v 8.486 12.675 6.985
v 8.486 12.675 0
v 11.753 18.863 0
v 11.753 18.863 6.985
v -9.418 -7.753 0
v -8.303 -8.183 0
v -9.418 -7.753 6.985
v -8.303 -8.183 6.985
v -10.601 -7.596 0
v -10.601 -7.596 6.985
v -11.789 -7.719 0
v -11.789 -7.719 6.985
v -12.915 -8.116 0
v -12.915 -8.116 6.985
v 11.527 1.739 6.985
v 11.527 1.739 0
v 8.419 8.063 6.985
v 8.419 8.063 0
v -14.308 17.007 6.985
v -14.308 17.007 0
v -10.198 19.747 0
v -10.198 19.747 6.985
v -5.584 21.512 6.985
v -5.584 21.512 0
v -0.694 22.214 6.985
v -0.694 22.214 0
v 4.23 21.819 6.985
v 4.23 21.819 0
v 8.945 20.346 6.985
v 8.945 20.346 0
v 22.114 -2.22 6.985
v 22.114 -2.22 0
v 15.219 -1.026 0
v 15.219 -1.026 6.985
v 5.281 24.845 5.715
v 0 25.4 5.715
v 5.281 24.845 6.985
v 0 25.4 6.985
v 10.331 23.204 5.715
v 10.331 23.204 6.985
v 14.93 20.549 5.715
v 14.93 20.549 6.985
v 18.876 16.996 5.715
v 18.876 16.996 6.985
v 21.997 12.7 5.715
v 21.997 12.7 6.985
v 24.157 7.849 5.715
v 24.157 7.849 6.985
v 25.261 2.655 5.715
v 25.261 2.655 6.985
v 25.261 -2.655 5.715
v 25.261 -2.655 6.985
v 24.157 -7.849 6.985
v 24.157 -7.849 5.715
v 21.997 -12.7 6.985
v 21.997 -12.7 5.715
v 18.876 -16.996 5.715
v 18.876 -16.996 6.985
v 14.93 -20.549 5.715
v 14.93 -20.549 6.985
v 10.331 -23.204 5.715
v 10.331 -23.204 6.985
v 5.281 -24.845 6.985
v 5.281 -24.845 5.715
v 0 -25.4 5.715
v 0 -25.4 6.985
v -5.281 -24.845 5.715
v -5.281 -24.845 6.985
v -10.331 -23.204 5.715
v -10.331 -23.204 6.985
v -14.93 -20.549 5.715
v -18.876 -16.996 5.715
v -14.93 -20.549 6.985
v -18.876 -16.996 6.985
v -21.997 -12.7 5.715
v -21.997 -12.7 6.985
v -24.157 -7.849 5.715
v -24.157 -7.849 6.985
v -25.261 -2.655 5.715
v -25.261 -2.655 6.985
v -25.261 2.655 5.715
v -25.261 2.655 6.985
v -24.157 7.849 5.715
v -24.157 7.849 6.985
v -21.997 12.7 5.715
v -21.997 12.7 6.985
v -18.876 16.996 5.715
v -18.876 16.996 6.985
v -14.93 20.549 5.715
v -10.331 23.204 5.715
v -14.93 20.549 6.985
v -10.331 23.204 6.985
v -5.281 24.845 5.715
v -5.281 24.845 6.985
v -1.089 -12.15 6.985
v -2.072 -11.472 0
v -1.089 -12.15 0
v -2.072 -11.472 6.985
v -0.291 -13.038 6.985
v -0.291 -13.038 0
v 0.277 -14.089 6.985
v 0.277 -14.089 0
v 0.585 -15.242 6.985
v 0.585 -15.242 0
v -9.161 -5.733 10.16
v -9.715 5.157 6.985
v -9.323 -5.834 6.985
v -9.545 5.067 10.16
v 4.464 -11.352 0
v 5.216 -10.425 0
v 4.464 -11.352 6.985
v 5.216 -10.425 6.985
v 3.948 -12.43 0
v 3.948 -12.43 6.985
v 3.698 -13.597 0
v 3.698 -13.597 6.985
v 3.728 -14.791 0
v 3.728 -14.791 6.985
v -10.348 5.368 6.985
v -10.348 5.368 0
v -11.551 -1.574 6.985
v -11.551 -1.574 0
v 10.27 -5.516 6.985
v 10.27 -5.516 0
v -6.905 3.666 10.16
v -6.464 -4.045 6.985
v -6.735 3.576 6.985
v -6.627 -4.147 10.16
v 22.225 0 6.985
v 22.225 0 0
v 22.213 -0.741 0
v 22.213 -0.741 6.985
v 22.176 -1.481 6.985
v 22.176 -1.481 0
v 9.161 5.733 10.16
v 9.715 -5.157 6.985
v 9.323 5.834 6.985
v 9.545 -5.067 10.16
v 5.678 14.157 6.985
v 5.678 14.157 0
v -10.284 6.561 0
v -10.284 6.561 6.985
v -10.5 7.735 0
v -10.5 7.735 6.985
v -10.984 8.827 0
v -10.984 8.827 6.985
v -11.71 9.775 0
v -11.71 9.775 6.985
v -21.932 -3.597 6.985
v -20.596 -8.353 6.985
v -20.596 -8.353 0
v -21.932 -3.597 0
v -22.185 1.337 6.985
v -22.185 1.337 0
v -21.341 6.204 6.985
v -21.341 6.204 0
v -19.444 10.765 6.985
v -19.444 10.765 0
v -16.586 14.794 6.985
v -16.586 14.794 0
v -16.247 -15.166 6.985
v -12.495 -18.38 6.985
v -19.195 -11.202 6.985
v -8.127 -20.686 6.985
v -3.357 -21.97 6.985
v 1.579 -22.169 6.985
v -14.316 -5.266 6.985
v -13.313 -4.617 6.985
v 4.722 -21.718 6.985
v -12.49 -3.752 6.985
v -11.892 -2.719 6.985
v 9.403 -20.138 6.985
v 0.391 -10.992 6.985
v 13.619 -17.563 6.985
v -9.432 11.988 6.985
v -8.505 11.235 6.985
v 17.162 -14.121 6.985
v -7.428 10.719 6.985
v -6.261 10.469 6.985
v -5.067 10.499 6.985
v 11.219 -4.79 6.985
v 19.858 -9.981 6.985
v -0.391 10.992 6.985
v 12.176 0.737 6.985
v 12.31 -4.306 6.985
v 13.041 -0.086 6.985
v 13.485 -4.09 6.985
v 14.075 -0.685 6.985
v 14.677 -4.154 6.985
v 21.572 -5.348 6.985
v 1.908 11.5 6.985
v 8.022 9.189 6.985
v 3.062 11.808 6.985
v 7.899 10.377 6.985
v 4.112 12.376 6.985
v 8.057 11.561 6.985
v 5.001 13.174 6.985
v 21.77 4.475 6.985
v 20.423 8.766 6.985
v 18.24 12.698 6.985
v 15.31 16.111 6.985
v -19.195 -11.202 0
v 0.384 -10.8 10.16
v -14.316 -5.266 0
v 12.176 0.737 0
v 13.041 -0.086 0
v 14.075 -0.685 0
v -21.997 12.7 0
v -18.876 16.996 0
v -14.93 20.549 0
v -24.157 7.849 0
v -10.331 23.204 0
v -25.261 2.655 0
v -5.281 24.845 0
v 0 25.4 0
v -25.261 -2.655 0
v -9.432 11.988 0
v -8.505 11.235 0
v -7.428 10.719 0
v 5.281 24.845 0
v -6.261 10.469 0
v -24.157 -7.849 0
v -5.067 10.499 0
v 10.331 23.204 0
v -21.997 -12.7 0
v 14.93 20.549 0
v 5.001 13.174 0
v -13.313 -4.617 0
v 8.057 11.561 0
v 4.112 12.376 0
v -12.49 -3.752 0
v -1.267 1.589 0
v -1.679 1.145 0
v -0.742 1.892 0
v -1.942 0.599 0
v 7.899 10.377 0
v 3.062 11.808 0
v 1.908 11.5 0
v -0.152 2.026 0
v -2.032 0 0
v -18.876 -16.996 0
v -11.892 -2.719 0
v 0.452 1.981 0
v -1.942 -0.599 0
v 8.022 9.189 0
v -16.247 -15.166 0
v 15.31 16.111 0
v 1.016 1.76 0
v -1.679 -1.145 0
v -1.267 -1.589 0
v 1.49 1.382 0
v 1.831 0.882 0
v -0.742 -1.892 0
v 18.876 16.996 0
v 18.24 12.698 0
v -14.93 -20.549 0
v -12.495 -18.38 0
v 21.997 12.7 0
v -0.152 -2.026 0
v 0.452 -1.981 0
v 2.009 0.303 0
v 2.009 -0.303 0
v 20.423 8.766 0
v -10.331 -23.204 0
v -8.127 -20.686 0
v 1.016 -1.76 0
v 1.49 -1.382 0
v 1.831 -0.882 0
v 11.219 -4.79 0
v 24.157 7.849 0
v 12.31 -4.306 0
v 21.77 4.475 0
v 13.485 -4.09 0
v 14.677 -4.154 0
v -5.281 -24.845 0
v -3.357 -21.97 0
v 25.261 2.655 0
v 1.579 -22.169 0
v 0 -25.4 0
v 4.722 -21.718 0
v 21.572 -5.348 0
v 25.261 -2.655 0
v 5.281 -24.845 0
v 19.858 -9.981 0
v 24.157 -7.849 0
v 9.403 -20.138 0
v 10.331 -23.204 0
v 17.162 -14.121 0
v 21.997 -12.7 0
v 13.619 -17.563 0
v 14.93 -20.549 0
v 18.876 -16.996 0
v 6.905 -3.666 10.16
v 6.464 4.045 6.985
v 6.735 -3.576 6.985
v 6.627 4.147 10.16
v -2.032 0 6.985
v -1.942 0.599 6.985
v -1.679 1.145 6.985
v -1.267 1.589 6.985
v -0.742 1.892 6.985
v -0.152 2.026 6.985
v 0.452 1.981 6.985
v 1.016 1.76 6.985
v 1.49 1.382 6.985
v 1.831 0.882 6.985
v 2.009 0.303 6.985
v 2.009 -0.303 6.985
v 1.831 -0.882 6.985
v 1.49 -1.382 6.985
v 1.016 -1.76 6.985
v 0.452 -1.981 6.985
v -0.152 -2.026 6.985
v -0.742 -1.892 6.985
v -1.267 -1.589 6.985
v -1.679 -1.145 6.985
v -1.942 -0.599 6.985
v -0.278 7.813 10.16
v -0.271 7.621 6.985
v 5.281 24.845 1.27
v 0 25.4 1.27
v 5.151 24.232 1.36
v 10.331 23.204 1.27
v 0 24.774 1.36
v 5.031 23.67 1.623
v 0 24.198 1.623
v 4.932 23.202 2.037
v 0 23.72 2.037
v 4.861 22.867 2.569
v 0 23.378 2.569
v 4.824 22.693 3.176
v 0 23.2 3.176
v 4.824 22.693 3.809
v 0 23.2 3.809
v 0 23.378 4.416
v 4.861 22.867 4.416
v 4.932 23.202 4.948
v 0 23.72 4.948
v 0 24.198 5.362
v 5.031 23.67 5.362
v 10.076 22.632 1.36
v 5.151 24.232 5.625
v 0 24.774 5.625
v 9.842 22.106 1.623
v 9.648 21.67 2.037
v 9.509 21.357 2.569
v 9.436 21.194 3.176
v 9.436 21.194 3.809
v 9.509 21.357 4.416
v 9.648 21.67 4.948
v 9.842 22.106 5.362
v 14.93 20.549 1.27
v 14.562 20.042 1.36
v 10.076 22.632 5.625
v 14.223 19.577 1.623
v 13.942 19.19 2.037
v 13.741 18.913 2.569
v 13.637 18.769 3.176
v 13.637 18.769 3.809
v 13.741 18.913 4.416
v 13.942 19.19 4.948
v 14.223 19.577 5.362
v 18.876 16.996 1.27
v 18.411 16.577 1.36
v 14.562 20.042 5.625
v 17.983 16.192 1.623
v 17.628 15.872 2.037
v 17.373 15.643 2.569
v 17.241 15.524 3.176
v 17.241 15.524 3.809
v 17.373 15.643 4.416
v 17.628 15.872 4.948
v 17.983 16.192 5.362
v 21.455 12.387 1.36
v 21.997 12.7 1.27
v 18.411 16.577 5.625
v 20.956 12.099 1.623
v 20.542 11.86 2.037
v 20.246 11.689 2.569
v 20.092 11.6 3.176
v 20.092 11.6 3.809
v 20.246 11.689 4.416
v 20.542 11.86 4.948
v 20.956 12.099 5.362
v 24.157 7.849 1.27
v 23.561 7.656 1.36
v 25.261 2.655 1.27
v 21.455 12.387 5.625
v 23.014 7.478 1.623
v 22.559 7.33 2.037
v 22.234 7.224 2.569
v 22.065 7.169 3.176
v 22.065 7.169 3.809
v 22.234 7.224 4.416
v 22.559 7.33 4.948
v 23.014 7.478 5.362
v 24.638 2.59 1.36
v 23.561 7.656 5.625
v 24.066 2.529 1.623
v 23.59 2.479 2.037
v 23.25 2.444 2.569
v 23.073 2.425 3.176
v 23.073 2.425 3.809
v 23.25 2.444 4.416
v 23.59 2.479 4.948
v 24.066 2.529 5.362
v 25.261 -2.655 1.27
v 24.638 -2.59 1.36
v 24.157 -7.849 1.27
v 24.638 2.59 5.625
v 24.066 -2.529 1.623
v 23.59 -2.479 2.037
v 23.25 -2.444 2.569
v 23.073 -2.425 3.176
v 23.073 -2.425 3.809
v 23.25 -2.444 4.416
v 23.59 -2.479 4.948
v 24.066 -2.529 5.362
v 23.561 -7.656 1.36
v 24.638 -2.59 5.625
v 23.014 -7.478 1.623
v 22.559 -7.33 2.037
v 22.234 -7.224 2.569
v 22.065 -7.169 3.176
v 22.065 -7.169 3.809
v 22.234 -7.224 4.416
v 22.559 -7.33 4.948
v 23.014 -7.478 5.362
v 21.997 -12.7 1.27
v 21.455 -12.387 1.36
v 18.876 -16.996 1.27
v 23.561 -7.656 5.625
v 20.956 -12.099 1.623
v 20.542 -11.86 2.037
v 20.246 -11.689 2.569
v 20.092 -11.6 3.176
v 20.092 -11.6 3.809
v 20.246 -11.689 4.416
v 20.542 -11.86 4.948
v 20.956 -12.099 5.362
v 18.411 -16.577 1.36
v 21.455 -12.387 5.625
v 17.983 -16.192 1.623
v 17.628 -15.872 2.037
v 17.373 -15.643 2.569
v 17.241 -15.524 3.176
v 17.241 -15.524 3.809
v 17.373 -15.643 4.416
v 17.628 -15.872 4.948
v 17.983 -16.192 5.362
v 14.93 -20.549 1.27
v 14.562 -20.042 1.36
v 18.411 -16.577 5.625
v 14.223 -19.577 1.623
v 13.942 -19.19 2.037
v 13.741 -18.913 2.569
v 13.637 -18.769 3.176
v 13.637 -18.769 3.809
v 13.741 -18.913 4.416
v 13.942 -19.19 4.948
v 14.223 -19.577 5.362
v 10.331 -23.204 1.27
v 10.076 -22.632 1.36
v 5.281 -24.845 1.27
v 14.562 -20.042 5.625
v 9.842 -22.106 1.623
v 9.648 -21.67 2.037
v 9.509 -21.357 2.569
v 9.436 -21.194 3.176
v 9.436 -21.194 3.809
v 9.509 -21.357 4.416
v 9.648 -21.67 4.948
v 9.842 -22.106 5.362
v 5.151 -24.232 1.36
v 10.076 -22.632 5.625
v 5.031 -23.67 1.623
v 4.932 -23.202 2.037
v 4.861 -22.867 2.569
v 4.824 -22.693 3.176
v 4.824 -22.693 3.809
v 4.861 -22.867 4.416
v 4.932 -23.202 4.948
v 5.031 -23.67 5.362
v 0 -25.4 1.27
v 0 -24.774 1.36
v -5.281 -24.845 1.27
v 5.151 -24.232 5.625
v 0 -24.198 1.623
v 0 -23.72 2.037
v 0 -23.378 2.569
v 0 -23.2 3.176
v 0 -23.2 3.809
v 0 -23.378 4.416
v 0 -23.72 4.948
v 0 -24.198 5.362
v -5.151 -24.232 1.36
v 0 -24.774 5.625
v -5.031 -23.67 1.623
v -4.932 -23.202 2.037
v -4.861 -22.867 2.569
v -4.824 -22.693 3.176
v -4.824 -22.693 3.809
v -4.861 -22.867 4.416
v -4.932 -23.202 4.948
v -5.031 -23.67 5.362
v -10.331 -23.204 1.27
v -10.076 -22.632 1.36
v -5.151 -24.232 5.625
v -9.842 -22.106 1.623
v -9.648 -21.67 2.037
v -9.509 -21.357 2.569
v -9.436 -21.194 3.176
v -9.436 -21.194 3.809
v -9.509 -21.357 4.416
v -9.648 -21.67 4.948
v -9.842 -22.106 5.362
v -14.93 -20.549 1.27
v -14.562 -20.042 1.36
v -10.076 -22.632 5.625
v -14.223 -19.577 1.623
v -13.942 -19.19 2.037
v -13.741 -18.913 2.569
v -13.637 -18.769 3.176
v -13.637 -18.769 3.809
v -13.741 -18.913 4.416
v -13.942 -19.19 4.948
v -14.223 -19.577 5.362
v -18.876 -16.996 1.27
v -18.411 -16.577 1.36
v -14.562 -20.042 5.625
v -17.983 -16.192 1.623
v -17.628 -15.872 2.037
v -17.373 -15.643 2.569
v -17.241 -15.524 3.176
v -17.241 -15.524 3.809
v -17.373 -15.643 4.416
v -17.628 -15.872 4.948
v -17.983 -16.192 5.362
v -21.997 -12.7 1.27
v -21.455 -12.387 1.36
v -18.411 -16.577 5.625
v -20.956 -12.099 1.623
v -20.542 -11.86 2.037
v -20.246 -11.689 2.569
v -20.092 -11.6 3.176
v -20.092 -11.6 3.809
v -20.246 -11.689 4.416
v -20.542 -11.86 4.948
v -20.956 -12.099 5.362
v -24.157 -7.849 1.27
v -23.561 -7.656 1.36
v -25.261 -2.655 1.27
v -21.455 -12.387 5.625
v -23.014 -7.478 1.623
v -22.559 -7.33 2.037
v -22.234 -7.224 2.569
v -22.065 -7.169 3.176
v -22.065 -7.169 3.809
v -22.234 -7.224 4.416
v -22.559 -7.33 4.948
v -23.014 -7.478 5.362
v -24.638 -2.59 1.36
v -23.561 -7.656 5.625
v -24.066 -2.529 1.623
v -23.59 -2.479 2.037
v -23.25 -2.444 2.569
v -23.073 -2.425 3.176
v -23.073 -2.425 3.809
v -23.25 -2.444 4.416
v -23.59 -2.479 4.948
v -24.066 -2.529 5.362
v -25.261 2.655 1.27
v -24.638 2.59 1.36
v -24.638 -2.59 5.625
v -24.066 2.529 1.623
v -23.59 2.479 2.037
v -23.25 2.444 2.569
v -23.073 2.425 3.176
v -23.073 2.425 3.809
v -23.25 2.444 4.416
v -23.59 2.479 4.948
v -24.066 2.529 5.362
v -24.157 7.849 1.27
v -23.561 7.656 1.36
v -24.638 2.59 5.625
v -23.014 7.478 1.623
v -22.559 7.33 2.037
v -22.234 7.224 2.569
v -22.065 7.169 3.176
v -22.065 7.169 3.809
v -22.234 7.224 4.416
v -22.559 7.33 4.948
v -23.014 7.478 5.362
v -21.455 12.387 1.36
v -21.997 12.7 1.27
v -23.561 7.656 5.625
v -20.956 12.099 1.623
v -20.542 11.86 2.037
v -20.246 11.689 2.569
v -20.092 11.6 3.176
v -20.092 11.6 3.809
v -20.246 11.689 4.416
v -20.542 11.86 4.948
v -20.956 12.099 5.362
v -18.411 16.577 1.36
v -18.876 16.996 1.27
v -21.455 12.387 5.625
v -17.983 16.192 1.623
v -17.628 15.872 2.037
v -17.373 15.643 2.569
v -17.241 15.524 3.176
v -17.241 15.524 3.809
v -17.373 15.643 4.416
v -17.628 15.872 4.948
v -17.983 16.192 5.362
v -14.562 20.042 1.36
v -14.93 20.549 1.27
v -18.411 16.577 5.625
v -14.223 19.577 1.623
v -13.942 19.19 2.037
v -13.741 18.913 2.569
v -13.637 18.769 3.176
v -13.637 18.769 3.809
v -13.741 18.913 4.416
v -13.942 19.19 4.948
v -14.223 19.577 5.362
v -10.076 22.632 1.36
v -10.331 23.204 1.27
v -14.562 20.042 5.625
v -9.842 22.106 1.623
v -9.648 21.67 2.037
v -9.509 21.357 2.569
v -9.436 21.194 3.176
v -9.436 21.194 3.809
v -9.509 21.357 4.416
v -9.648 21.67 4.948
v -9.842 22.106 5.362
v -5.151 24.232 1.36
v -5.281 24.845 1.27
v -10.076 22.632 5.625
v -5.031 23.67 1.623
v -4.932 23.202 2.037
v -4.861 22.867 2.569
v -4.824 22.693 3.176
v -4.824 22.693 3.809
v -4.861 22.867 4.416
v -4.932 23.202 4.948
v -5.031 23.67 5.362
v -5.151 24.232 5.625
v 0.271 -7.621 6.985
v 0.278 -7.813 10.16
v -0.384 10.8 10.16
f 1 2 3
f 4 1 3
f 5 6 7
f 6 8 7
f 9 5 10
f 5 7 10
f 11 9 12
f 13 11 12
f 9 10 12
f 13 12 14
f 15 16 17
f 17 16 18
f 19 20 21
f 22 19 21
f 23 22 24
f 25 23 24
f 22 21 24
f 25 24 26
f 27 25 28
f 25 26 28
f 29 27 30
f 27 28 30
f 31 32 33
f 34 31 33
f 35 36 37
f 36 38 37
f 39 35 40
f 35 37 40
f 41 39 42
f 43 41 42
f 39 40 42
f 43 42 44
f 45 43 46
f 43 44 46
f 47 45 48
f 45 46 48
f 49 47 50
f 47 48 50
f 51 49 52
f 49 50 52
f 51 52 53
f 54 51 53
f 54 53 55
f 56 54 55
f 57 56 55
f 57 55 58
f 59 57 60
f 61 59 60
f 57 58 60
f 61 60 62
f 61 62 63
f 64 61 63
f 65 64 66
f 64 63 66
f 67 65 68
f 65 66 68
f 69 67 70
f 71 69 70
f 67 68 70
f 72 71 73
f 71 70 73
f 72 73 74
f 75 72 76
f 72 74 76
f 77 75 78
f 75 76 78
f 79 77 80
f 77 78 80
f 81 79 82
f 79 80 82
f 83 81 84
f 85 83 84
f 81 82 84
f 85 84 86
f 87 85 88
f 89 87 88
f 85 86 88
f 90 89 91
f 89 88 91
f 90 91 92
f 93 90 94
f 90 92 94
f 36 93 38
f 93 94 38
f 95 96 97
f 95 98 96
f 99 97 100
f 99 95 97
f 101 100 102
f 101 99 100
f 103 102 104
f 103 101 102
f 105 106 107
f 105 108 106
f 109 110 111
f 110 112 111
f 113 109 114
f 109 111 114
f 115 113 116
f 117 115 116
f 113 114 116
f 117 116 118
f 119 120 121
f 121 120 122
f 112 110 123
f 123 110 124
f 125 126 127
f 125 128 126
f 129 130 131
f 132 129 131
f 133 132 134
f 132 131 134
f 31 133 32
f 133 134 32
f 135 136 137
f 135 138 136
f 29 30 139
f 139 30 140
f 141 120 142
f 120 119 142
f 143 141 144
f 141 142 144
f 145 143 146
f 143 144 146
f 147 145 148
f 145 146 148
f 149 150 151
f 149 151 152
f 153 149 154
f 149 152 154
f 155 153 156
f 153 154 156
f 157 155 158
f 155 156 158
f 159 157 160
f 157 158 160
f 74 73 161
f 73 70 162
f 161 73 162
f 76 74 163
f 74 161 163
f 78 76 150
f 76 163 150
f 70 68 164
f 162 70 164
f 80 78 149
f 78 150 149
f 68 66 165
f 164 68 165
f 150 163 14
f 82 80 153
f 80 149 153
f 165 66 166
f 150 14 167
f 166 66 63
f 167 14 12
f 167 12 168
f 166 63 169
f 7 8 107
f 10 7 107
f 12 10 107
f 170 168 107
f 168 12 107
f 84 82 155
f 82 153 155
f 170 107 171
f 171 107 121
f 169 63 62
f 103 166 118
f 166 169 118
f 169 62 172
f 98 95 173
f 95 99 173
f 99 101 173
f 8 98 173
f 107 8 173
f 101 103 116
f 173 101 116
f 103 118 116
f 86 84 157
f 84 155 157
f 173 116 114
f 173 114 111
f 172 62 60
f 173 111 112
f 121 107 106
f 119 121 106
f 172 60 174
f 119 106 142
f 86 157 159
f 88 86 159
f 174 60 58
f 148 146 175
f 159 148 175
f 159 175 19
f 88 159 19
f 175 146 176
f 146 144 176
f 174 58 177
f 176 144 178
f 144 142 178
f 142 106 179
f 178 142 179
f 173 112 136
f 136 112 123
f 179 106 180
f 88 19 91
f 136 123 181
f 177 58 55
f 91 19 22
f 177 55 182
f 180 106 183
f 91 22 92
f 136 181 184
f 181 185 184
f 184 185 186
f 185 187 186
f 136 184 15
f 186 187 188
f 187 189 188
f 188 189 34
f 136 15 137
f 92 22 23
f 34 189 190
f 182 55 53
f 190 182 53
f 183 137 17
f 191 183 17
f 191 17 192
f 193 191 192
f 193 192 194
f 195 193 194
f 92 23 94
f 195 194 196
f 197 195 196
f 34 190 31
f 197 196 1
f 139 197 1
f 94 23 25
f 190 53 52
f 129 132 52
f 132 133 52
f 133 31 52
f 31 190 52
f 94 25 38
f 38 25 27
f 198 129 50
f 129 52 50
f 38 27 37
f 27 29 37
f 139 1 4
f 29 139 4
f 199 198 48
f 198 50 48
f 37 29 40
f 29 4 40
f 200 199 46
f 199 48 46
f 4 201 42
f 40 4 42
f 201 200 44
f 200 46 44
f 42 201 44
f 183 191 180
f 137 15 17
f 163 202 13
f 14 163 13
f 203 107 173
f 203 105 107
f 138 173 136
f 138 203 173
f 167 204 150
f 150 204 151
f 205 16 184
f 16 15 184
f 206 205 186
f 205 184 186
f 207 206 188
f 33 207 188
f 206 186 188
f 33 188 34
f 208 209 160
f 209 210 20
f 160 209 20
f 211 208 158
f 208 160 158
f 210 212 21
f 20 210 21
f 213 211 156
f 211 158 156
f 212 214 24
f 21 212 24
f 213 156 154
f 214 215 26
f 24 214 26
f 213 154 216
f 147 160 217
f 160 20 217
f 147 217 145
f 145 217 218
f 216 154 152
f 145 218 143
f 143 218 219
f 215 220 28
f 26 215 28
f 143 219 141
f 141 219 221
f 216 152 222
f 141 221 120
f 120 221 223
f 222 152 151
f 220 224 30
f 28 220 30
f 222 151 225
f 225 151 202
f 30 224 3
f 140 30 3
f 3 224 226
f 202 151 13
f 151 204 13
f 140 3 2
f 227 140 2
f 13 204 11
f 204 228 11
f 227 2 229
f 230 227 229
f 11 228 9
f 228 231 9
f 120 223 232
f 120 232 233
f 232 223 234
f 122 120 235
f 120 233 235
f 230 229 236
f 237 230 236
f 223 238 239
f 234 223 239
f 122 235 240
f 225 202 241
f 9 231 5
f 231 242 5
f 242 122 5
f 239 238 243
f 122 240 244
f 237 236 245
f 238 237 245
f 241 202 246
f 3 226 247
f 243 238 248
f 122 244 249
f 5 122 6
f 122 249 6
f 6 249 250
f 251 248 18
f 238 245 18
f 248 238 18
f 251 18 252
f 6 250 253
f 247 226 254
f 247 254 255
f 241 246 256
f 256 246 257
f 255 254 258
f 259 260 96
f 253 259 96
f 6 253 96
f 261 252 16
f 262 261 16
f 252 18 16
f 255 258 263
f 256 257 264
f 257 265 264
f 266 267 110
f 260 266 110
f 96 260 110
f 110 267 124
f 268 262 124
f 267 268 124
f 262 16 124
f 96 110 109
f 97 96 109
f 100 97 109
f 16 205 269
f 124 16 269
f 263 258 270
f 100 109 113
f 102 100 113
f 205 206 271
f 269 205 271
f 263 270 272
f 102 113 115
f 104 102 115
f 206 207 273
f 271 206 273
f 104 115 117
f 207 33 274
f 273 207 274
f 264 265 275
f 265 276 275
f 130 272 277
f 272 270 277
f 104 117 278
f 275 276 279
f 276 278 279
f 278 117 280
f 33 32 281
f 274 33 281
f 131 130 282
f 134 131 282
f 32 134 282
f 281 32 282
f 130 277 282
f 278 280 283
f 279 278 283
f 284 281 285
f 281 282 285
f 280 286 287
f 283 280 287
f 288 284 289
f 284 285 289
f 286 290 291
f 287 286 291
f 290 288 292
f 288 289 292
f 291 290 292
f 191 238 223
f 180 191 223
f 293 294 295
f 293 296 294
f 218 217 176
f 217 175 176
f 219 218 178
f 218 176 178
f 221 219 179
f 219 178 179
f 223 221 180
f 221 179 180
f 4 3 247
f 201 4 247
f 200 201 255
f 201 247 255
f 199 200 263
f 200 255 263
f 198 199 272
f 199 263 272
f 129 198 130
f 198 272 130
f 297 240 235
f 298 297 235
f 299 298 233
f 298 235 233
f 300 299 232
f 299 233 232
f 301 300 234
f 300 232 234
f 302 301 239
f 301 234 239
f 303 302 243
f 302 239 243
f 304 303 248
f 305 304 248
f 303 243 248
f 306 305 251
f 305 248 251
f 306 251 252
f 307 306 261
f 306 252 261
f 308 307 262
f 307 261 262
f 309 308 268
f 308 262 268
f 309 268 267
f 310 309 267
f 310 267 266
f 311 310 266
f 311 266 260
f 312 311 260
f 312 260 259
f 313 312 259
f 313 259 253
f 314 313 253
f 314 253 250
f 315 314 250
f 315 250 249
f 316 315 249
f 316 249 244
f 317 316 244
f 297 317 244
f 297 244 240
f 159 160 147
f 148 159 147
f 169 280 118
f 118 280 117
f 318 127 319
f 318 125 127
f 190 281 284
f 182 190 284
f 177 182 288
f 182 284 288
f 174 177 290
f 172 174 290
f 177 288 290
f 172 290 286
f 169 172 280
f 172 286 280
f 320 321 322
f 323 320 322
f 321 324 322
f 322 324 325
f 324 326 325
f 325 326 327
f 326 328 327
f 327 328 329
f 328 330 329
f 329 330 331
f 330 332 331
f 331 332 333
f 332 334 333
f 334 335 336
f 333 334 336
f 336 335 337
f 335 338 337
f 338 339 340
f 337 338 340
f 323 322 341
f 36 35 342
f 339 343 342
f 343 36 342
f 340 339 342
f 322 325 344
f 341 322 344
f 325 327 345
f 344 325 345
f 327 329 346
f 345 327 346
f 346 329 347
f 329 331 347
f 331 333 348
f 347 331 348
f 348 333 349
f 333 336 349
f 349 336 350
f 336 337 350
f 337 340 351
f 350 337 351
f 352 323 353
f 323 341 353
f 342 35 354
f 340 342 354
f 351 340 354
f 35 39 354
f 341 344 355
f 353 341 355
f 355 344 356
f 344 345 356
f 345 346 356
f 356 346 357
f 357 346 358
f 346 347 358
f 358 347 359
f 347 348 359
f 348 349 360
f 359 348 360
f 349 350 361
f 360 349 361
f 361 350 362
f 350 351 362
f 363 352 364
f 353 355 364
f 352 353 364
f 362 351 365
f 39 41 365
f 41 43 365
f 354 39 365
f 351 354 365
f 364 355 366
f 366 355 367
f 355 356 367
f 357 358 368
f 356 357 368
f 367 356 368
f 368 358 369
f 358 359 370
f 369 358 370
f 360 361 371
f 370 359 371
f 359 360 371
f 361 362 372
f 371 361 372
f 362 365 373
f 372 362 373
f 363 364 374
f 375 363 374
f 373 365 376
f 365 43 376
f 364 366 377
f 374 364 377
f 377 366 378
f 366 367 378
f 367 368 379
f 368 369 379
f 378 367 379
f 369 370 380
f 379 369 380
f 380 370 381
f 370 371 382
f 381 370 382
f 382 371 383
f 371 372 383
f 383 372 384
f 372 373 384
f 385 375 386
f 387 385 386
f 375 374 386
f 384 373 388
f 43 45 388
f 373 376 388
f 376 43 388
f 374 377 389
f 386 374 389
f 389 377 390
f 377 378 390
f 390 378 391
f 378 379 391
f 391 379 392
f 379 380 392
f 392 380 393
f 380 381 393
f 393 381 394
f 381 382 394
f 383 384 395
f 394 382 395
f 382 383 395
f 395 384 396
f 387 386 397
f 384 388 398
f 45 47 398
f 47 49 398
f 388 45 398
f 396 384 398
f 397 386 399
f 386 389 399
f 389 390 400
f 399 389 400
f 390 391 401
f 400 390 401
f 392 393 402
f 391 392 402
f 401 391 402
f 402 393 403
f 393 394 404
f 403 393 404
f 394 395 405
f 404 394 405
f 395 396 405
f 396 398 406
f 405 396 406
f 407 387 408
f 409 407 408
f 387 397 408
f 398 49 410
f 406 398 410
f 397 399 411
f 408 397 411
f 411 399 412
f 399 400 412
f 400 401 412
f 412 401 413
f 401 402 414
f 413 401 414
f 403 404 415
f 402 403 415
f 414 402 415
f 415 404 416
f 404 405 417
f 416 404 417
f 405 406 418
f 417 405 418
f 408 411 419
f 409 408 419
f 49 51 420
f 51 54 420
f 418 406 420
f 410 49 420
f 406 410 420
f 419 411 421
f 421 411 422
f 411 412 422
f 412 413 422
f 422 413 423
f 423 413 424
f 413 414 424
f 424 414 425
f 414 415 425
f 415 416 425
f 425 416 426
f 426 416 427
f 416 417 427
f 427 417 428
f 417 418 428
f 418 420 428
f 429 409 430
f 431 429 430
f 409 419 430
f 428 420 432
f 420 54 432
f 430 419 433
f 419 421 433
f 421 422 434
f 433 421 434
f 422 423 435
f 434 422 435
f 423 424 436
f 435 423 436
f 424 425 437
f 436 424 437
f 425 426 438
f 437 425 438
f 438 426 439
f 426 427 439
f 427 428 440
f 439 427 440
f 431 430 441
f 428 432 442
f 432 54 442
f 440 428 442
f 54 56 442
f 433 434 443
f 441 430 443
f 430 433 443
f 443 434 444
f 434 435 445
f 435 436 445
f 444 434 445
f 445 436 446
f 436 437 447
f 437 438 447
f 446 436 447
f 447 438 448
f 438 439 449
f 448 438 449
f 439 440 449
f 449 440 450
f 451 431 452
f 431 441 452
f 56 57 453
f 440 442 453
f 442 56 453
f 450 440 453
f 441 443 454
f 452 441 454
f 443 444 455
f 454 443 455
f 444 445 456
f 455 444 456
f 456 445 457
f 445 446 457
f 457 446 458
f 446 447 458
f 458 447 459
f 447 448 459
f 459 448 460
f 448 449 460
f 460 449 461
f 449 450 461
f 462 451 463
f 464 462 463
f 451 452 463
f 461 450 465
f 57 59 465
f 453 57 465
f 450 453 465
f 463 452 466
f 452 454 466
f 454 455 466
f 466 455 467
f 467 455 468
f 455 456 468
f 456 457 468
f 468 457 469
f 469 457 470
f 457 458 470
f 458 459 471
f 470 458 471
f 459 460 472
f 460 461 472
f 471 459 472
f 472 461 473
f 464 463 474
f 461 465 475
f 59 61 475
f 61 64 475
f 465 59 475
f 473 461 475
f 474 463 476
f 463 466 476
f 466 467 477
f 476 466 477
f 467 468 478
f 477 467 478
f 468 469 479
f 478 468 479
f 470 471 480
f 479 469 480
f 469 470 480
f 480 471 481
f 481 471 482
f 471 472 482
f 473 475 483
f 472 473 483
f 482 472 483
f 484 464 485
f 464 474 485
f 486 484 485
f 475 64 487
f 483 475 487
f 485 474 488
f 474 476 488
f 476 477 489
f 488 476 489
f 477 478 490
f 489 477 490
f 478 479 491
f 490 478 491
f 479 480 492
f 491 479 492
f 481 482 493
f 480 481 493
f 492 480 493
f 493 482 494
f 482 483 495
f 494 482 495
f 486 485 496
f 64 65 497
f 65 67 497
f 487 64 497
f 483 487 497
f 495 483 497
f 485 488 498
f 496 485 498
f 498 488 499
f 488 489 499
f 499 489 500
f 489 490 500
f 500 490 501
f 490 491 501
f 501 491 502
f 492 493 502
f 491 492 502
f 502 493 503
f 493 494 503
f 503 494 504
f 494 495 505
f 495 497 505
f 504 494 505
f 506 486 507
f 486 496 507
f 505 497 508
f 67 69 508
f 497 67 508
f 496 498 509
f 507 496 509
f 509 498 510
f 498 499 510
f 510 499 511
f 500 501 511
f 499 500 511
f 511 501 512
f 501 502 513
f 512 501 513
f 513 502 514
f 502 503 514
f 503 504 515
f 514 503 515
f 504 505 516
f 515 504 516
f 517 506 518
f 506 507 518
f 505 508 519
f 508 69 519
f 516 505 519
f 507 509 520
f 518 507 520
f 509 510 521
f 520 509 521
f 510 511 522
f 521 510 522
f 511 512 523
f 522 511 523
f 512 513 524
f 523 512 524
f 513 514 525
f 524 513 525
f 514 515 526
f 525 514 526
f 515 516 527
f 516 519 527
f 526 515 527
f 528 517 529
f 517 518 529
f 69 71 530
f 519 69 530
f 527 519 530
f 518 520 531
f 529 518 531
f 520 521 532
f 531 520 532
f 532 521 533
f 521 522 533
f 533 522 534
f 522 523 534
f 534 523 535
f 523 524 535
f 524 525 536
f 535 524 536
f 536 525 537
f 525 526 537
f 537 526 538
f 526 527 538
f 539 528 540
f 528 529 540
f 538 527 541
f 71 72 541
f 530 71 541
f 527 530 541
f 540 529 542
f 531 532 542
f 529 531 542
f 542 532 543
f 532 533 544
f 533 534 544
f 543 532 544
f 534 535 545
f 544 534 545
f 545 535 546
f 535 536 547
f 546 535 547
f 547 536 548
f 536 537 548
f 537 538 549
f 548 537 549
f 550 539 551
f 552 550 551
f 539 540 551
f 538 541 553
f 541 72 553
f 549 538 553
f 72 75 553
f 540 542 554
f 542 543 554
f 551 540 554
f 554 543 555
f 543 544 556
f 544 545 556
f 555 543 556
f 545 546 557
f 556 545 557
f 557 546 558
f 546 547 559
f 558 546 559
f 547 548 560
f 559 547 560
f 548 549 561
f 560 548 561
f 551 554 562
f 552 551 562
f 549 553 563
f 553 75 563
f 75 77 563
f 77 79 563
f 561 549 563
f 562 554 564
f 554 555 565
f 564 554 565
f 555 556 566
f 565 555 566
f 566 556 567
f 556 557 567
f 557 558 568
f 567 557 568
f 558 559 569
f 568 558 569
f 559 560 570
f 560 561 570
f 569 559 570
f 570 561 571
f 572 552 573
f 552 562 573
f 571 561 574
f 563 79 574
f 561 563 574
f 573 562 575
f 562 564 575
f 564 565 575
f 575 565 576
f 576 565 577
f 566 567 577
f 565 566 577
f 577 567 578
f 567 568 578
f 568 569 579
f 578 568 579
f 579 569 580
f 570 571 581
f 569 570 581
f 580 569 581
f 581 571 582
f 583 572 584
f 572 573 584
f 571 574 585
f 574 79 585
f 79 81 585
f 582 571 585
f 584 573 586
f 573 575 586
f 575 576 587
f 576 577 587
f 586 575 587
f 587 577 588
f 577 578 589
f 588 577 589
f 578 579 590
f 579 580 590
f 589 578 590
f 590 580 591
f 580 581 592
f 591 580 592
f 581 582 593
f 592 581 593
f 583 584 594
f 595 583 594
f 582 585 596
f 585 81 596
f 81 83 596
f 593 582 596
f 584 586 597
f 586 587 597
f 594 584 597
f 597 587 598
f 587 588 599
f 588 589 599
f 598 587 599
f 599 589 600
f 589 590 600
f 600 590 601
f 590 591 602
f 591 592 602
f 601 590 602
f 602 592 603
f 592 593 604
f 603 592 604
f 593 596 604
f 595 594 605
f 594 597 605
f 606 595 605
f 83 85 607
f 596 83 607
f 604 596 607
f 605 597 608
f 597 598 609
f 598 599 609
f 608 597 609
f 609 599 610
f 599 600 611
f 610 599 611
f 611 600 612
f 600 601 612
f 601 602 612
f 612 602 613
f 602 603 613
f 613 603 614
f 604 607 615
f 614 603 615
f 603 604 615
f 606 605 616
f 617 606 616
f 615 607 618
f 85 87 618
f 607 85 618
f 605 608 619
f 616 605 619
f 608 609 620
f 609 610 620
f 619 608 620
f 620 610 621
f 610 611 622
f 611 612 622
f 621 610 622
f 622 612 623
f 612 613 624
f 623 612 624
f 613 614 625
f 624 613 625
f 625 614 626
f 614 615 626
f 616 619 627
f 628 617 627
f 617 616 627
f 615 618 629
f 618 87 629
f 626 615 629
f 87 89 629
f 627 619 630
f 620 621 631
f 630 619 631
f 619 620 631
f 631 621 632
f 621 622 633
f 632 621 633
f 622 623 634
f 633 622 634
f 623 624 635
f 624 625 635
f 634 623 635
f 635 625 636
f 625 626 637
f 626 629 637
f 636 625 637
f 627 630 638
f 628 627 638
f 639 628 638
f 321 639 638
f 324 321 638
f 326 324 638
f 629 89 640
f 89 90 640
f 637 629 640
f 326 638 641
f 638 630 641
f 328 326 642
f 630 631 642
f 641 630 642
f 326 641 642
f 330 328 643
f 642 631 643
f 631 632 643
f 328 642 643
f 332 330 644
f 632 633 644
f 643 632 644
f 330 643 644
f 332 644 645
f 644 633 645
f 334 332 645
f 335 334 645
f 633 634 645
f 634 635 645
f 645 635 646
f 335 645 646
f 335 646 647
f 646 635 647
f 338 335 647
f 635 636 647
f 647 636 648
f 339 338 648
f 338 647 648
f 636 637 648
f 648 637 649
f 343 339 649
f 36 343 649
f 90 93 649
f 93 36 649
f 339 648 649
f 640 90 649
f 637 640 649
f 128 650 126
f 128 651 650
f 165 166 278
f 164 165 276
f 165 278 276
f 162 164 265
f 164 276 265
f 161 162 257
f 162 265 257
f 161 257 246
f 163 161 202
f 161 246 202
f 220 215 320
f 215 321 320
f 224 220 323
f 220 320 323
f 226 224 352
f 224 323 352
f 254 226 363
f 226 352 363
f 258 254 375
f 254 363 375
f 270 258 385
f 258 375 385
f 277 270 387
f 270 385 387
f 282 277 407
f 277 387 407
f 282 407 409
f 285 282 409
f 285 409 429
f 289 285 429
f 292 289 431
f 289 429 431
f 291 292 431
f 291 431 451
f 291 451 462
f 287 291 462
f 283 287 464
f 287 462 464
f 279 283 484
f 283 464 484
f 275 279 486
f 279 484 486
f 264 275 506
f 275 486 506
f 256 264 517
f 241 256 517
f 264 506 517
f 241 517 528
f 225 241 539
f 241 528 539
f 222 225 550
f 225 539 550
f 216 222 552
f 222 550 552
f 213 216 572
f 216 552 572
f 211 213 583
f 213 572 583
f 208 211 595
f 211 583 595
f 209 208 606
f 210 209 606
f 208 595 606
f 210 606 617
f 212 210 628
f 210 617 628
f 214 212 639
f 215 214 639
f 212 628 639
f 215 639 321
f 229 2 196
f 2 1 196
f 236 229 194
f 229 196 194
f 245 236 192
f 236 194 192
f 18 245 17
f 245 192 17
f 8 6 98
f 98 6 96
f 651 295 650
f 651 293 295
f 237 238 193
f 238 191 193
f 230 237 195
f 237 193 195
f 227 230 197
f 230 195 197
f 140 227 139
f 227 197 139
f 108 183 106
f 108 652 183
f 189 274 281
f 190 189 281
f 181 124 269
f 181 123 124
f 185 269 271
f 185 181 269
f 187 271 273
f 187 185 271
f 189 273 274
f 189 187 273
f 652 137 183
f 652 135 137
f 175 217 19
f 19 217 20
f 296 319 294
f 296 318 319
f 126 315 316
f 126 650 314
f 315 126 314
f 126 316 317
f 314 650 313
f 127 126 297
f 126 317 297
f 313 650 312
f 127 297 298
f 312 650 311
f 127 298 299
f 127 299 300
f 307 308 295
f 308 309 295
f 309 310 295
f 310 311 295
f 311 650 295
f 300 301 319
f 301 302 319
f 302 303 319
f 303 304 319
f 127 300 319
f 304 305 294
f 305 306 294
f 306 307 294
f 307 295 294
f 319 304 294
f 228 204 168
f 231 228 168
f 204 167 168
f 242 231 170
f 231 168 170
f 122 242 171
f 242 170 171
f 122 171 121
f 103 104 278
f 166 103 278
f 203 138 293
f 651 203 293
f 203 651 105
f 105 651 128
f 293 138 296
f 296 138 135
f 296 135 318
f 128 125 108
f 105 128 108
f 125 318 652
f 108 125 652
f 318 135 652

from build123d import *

# Parameters (mm, degrees)
F3_DEPTH = 6.986
F5_DEPTH = 3.175
F5_TAPER = 3
F7_D     = 4.064
F8_R     = 5.08


with BuildPart() as f1:
    # F0 (on Right) → F1 (revolve)
    with BuildSketch(Plane.YZ):
        with BuildLine():
            Line((0, 6.985), (0, 0))
            Line((0, 0), (25.4, 0))
            Line((25.4, 0), (25.4, 1.27))
            ThreePointArc((25.4, 1.27), (23.1775, 3.4925), (25.4, 5.715))
            Line((25.4, 5.715), (25.4, 6.985))
            Line((25.4, 6.985), (0, 6.985))
        make_face()
    revolve(axis=Axis((0, 0, 3.4925), (0, 0, -1)))

    # F2 (on face) → F3 (cut, through all)
    with BuildSketch(Plane(origin=(0, 0, 0), x_dir=(1, 0, 0), z_dir=(0, 0, -1))):
        with BuildLine():
            Line((0.2169925916, 12.6803131585), (1.5794517729, 22.1688059466))
            ThreePointArc((1.5794517729, 22.1688059466), (-10.3752942251, 19.6546151004), (-19.1953566714, 11.2021831469))
            Line((-19.1953566714, 11.2021831469), (-10.5922868167, 6.9743019418))
            Line((-10.5922868167, 6.9743019418), (0.2169925916, 12.6803131585))
        make_face()
        with BuildLine():
            Line((12.1267488565, 3.7120600417), (21.5718647936, 5.3483898817))
            ThreePointArc((21.5718647936, 5.3483898817), (15.4865075293, 15.9411012651), (4.722217854, 21.7175340115))
            Line((4.722217854, 21.7175340115), (3.3597586727, 12.2290412234))
            Line((3.3597586727, 12.2290412234), (12.1267488565, 3.7120600417))
        make_face()
        with BuildLine():
            ThreePointArc((11.7526938703, -18.8633192146), (19.4313438324, -10.787655068), (22.225, 0))
            ThreePointArc((22.225, 0), (22.1971945583, 1.1113859542), (22.1138478075, 2.2199910241))
            Line((22.1138478075, 2.2199910241), (12.6687318704, 0.5836611841))
            Line((12.6687318704, 0.5836611841), (7.2777503747, -10.3861338845))
            Line((7.2777503747, -10.3861338845), (11.7526938703, -18.8633192146))
        make_face()
        with BuildLine():
            ThreePointArc((-14.3083005224, -17.006562297), (-3.1589035458, -21.9993625678), (8.9448917131, -20.3455041039))
            Line((8.9448917131, -20.3455041039), (4.4699482176, -11.8683187738))
            Line((4.4699482176, -11.8683187738), (-7.6288517633, -10.131043794))
            Line((-7.6288517633, -10.131043794), (-14.3083005224, -17.006562297))
        make_face()
        with BuildLine():
            ThreePointArc((-20.5957099144, 8.3526856833), (-21.8987920037, -3.7938810973), (-16.5856007031, -14.7942040785))
            Line((-16.5856007031, -14.7942040785), (-9.906151944, -7.9186855756))
            Line((-9.906151944, -7.9186855756), (-11.9926400596, 4.1248044782))
            Line((-11.9926400596, 4.1248044782), (-20.5957099144, 8.3526856833))
        make_face()
    extrude(amount=-F3_DEPTH, mode=Mode.SUBTRACT)

    # F4 (on face) → F5 (join)
    with BuildSketch(Plane.XY.offset(6.985)):
        Polygon((9.7145011491, -5.157127827), (9.3234542833, 5.8344408667), (-0.3910468658, 10.9915686937), (-9.7145011491, 5.157127827), (-9.3234542833, -5.8344408667), (0.3910468658, -10.9915686937), align=None)
        Polygon((-6.7353874634, 3.5756086268), (-0.2711258269, 7.620820961), (6.4642616364, 4.0452123342), (6.7353874634, -3.5756086268), (0.2711258269, -7.620820961), (-6.4642616364, -4.0452123342), align=None, mode=Mode.SUBTRACT)
    extrude(amount=F5_DEPTH, taper=F5_TAPER)

    # F7 (through all)
    with Locations(Plane.XY.offset(6.985)):
        with Locations((0, 0)):
            Hole(F7_D / 2)

    # F8
    f8_edges = [f1.edges().sort_by_distance(p)[0] for p in [
        (-11.99264, -4.124804, 3.4925),
        (-9.906152, 7.918686, 3.4925),
        (4.469948, 11.868319, 3.4925),
        (0.216993, -12.680313, 3.4925),
        (7.27775, 10.386134, 3.4925),
        (12.668732, -0.583661, 3.4925),
        (3.359759, -12.229041, 3.4925),
        (12.126749, -3.71206, 3.4925),
        (-7.628852, 10.131044, 3.4925),
        (-10.592287, -6.974302, 3.4925),
    ]]
    fillet(f8_edges, radius=F8_R)


solid = f1.part
